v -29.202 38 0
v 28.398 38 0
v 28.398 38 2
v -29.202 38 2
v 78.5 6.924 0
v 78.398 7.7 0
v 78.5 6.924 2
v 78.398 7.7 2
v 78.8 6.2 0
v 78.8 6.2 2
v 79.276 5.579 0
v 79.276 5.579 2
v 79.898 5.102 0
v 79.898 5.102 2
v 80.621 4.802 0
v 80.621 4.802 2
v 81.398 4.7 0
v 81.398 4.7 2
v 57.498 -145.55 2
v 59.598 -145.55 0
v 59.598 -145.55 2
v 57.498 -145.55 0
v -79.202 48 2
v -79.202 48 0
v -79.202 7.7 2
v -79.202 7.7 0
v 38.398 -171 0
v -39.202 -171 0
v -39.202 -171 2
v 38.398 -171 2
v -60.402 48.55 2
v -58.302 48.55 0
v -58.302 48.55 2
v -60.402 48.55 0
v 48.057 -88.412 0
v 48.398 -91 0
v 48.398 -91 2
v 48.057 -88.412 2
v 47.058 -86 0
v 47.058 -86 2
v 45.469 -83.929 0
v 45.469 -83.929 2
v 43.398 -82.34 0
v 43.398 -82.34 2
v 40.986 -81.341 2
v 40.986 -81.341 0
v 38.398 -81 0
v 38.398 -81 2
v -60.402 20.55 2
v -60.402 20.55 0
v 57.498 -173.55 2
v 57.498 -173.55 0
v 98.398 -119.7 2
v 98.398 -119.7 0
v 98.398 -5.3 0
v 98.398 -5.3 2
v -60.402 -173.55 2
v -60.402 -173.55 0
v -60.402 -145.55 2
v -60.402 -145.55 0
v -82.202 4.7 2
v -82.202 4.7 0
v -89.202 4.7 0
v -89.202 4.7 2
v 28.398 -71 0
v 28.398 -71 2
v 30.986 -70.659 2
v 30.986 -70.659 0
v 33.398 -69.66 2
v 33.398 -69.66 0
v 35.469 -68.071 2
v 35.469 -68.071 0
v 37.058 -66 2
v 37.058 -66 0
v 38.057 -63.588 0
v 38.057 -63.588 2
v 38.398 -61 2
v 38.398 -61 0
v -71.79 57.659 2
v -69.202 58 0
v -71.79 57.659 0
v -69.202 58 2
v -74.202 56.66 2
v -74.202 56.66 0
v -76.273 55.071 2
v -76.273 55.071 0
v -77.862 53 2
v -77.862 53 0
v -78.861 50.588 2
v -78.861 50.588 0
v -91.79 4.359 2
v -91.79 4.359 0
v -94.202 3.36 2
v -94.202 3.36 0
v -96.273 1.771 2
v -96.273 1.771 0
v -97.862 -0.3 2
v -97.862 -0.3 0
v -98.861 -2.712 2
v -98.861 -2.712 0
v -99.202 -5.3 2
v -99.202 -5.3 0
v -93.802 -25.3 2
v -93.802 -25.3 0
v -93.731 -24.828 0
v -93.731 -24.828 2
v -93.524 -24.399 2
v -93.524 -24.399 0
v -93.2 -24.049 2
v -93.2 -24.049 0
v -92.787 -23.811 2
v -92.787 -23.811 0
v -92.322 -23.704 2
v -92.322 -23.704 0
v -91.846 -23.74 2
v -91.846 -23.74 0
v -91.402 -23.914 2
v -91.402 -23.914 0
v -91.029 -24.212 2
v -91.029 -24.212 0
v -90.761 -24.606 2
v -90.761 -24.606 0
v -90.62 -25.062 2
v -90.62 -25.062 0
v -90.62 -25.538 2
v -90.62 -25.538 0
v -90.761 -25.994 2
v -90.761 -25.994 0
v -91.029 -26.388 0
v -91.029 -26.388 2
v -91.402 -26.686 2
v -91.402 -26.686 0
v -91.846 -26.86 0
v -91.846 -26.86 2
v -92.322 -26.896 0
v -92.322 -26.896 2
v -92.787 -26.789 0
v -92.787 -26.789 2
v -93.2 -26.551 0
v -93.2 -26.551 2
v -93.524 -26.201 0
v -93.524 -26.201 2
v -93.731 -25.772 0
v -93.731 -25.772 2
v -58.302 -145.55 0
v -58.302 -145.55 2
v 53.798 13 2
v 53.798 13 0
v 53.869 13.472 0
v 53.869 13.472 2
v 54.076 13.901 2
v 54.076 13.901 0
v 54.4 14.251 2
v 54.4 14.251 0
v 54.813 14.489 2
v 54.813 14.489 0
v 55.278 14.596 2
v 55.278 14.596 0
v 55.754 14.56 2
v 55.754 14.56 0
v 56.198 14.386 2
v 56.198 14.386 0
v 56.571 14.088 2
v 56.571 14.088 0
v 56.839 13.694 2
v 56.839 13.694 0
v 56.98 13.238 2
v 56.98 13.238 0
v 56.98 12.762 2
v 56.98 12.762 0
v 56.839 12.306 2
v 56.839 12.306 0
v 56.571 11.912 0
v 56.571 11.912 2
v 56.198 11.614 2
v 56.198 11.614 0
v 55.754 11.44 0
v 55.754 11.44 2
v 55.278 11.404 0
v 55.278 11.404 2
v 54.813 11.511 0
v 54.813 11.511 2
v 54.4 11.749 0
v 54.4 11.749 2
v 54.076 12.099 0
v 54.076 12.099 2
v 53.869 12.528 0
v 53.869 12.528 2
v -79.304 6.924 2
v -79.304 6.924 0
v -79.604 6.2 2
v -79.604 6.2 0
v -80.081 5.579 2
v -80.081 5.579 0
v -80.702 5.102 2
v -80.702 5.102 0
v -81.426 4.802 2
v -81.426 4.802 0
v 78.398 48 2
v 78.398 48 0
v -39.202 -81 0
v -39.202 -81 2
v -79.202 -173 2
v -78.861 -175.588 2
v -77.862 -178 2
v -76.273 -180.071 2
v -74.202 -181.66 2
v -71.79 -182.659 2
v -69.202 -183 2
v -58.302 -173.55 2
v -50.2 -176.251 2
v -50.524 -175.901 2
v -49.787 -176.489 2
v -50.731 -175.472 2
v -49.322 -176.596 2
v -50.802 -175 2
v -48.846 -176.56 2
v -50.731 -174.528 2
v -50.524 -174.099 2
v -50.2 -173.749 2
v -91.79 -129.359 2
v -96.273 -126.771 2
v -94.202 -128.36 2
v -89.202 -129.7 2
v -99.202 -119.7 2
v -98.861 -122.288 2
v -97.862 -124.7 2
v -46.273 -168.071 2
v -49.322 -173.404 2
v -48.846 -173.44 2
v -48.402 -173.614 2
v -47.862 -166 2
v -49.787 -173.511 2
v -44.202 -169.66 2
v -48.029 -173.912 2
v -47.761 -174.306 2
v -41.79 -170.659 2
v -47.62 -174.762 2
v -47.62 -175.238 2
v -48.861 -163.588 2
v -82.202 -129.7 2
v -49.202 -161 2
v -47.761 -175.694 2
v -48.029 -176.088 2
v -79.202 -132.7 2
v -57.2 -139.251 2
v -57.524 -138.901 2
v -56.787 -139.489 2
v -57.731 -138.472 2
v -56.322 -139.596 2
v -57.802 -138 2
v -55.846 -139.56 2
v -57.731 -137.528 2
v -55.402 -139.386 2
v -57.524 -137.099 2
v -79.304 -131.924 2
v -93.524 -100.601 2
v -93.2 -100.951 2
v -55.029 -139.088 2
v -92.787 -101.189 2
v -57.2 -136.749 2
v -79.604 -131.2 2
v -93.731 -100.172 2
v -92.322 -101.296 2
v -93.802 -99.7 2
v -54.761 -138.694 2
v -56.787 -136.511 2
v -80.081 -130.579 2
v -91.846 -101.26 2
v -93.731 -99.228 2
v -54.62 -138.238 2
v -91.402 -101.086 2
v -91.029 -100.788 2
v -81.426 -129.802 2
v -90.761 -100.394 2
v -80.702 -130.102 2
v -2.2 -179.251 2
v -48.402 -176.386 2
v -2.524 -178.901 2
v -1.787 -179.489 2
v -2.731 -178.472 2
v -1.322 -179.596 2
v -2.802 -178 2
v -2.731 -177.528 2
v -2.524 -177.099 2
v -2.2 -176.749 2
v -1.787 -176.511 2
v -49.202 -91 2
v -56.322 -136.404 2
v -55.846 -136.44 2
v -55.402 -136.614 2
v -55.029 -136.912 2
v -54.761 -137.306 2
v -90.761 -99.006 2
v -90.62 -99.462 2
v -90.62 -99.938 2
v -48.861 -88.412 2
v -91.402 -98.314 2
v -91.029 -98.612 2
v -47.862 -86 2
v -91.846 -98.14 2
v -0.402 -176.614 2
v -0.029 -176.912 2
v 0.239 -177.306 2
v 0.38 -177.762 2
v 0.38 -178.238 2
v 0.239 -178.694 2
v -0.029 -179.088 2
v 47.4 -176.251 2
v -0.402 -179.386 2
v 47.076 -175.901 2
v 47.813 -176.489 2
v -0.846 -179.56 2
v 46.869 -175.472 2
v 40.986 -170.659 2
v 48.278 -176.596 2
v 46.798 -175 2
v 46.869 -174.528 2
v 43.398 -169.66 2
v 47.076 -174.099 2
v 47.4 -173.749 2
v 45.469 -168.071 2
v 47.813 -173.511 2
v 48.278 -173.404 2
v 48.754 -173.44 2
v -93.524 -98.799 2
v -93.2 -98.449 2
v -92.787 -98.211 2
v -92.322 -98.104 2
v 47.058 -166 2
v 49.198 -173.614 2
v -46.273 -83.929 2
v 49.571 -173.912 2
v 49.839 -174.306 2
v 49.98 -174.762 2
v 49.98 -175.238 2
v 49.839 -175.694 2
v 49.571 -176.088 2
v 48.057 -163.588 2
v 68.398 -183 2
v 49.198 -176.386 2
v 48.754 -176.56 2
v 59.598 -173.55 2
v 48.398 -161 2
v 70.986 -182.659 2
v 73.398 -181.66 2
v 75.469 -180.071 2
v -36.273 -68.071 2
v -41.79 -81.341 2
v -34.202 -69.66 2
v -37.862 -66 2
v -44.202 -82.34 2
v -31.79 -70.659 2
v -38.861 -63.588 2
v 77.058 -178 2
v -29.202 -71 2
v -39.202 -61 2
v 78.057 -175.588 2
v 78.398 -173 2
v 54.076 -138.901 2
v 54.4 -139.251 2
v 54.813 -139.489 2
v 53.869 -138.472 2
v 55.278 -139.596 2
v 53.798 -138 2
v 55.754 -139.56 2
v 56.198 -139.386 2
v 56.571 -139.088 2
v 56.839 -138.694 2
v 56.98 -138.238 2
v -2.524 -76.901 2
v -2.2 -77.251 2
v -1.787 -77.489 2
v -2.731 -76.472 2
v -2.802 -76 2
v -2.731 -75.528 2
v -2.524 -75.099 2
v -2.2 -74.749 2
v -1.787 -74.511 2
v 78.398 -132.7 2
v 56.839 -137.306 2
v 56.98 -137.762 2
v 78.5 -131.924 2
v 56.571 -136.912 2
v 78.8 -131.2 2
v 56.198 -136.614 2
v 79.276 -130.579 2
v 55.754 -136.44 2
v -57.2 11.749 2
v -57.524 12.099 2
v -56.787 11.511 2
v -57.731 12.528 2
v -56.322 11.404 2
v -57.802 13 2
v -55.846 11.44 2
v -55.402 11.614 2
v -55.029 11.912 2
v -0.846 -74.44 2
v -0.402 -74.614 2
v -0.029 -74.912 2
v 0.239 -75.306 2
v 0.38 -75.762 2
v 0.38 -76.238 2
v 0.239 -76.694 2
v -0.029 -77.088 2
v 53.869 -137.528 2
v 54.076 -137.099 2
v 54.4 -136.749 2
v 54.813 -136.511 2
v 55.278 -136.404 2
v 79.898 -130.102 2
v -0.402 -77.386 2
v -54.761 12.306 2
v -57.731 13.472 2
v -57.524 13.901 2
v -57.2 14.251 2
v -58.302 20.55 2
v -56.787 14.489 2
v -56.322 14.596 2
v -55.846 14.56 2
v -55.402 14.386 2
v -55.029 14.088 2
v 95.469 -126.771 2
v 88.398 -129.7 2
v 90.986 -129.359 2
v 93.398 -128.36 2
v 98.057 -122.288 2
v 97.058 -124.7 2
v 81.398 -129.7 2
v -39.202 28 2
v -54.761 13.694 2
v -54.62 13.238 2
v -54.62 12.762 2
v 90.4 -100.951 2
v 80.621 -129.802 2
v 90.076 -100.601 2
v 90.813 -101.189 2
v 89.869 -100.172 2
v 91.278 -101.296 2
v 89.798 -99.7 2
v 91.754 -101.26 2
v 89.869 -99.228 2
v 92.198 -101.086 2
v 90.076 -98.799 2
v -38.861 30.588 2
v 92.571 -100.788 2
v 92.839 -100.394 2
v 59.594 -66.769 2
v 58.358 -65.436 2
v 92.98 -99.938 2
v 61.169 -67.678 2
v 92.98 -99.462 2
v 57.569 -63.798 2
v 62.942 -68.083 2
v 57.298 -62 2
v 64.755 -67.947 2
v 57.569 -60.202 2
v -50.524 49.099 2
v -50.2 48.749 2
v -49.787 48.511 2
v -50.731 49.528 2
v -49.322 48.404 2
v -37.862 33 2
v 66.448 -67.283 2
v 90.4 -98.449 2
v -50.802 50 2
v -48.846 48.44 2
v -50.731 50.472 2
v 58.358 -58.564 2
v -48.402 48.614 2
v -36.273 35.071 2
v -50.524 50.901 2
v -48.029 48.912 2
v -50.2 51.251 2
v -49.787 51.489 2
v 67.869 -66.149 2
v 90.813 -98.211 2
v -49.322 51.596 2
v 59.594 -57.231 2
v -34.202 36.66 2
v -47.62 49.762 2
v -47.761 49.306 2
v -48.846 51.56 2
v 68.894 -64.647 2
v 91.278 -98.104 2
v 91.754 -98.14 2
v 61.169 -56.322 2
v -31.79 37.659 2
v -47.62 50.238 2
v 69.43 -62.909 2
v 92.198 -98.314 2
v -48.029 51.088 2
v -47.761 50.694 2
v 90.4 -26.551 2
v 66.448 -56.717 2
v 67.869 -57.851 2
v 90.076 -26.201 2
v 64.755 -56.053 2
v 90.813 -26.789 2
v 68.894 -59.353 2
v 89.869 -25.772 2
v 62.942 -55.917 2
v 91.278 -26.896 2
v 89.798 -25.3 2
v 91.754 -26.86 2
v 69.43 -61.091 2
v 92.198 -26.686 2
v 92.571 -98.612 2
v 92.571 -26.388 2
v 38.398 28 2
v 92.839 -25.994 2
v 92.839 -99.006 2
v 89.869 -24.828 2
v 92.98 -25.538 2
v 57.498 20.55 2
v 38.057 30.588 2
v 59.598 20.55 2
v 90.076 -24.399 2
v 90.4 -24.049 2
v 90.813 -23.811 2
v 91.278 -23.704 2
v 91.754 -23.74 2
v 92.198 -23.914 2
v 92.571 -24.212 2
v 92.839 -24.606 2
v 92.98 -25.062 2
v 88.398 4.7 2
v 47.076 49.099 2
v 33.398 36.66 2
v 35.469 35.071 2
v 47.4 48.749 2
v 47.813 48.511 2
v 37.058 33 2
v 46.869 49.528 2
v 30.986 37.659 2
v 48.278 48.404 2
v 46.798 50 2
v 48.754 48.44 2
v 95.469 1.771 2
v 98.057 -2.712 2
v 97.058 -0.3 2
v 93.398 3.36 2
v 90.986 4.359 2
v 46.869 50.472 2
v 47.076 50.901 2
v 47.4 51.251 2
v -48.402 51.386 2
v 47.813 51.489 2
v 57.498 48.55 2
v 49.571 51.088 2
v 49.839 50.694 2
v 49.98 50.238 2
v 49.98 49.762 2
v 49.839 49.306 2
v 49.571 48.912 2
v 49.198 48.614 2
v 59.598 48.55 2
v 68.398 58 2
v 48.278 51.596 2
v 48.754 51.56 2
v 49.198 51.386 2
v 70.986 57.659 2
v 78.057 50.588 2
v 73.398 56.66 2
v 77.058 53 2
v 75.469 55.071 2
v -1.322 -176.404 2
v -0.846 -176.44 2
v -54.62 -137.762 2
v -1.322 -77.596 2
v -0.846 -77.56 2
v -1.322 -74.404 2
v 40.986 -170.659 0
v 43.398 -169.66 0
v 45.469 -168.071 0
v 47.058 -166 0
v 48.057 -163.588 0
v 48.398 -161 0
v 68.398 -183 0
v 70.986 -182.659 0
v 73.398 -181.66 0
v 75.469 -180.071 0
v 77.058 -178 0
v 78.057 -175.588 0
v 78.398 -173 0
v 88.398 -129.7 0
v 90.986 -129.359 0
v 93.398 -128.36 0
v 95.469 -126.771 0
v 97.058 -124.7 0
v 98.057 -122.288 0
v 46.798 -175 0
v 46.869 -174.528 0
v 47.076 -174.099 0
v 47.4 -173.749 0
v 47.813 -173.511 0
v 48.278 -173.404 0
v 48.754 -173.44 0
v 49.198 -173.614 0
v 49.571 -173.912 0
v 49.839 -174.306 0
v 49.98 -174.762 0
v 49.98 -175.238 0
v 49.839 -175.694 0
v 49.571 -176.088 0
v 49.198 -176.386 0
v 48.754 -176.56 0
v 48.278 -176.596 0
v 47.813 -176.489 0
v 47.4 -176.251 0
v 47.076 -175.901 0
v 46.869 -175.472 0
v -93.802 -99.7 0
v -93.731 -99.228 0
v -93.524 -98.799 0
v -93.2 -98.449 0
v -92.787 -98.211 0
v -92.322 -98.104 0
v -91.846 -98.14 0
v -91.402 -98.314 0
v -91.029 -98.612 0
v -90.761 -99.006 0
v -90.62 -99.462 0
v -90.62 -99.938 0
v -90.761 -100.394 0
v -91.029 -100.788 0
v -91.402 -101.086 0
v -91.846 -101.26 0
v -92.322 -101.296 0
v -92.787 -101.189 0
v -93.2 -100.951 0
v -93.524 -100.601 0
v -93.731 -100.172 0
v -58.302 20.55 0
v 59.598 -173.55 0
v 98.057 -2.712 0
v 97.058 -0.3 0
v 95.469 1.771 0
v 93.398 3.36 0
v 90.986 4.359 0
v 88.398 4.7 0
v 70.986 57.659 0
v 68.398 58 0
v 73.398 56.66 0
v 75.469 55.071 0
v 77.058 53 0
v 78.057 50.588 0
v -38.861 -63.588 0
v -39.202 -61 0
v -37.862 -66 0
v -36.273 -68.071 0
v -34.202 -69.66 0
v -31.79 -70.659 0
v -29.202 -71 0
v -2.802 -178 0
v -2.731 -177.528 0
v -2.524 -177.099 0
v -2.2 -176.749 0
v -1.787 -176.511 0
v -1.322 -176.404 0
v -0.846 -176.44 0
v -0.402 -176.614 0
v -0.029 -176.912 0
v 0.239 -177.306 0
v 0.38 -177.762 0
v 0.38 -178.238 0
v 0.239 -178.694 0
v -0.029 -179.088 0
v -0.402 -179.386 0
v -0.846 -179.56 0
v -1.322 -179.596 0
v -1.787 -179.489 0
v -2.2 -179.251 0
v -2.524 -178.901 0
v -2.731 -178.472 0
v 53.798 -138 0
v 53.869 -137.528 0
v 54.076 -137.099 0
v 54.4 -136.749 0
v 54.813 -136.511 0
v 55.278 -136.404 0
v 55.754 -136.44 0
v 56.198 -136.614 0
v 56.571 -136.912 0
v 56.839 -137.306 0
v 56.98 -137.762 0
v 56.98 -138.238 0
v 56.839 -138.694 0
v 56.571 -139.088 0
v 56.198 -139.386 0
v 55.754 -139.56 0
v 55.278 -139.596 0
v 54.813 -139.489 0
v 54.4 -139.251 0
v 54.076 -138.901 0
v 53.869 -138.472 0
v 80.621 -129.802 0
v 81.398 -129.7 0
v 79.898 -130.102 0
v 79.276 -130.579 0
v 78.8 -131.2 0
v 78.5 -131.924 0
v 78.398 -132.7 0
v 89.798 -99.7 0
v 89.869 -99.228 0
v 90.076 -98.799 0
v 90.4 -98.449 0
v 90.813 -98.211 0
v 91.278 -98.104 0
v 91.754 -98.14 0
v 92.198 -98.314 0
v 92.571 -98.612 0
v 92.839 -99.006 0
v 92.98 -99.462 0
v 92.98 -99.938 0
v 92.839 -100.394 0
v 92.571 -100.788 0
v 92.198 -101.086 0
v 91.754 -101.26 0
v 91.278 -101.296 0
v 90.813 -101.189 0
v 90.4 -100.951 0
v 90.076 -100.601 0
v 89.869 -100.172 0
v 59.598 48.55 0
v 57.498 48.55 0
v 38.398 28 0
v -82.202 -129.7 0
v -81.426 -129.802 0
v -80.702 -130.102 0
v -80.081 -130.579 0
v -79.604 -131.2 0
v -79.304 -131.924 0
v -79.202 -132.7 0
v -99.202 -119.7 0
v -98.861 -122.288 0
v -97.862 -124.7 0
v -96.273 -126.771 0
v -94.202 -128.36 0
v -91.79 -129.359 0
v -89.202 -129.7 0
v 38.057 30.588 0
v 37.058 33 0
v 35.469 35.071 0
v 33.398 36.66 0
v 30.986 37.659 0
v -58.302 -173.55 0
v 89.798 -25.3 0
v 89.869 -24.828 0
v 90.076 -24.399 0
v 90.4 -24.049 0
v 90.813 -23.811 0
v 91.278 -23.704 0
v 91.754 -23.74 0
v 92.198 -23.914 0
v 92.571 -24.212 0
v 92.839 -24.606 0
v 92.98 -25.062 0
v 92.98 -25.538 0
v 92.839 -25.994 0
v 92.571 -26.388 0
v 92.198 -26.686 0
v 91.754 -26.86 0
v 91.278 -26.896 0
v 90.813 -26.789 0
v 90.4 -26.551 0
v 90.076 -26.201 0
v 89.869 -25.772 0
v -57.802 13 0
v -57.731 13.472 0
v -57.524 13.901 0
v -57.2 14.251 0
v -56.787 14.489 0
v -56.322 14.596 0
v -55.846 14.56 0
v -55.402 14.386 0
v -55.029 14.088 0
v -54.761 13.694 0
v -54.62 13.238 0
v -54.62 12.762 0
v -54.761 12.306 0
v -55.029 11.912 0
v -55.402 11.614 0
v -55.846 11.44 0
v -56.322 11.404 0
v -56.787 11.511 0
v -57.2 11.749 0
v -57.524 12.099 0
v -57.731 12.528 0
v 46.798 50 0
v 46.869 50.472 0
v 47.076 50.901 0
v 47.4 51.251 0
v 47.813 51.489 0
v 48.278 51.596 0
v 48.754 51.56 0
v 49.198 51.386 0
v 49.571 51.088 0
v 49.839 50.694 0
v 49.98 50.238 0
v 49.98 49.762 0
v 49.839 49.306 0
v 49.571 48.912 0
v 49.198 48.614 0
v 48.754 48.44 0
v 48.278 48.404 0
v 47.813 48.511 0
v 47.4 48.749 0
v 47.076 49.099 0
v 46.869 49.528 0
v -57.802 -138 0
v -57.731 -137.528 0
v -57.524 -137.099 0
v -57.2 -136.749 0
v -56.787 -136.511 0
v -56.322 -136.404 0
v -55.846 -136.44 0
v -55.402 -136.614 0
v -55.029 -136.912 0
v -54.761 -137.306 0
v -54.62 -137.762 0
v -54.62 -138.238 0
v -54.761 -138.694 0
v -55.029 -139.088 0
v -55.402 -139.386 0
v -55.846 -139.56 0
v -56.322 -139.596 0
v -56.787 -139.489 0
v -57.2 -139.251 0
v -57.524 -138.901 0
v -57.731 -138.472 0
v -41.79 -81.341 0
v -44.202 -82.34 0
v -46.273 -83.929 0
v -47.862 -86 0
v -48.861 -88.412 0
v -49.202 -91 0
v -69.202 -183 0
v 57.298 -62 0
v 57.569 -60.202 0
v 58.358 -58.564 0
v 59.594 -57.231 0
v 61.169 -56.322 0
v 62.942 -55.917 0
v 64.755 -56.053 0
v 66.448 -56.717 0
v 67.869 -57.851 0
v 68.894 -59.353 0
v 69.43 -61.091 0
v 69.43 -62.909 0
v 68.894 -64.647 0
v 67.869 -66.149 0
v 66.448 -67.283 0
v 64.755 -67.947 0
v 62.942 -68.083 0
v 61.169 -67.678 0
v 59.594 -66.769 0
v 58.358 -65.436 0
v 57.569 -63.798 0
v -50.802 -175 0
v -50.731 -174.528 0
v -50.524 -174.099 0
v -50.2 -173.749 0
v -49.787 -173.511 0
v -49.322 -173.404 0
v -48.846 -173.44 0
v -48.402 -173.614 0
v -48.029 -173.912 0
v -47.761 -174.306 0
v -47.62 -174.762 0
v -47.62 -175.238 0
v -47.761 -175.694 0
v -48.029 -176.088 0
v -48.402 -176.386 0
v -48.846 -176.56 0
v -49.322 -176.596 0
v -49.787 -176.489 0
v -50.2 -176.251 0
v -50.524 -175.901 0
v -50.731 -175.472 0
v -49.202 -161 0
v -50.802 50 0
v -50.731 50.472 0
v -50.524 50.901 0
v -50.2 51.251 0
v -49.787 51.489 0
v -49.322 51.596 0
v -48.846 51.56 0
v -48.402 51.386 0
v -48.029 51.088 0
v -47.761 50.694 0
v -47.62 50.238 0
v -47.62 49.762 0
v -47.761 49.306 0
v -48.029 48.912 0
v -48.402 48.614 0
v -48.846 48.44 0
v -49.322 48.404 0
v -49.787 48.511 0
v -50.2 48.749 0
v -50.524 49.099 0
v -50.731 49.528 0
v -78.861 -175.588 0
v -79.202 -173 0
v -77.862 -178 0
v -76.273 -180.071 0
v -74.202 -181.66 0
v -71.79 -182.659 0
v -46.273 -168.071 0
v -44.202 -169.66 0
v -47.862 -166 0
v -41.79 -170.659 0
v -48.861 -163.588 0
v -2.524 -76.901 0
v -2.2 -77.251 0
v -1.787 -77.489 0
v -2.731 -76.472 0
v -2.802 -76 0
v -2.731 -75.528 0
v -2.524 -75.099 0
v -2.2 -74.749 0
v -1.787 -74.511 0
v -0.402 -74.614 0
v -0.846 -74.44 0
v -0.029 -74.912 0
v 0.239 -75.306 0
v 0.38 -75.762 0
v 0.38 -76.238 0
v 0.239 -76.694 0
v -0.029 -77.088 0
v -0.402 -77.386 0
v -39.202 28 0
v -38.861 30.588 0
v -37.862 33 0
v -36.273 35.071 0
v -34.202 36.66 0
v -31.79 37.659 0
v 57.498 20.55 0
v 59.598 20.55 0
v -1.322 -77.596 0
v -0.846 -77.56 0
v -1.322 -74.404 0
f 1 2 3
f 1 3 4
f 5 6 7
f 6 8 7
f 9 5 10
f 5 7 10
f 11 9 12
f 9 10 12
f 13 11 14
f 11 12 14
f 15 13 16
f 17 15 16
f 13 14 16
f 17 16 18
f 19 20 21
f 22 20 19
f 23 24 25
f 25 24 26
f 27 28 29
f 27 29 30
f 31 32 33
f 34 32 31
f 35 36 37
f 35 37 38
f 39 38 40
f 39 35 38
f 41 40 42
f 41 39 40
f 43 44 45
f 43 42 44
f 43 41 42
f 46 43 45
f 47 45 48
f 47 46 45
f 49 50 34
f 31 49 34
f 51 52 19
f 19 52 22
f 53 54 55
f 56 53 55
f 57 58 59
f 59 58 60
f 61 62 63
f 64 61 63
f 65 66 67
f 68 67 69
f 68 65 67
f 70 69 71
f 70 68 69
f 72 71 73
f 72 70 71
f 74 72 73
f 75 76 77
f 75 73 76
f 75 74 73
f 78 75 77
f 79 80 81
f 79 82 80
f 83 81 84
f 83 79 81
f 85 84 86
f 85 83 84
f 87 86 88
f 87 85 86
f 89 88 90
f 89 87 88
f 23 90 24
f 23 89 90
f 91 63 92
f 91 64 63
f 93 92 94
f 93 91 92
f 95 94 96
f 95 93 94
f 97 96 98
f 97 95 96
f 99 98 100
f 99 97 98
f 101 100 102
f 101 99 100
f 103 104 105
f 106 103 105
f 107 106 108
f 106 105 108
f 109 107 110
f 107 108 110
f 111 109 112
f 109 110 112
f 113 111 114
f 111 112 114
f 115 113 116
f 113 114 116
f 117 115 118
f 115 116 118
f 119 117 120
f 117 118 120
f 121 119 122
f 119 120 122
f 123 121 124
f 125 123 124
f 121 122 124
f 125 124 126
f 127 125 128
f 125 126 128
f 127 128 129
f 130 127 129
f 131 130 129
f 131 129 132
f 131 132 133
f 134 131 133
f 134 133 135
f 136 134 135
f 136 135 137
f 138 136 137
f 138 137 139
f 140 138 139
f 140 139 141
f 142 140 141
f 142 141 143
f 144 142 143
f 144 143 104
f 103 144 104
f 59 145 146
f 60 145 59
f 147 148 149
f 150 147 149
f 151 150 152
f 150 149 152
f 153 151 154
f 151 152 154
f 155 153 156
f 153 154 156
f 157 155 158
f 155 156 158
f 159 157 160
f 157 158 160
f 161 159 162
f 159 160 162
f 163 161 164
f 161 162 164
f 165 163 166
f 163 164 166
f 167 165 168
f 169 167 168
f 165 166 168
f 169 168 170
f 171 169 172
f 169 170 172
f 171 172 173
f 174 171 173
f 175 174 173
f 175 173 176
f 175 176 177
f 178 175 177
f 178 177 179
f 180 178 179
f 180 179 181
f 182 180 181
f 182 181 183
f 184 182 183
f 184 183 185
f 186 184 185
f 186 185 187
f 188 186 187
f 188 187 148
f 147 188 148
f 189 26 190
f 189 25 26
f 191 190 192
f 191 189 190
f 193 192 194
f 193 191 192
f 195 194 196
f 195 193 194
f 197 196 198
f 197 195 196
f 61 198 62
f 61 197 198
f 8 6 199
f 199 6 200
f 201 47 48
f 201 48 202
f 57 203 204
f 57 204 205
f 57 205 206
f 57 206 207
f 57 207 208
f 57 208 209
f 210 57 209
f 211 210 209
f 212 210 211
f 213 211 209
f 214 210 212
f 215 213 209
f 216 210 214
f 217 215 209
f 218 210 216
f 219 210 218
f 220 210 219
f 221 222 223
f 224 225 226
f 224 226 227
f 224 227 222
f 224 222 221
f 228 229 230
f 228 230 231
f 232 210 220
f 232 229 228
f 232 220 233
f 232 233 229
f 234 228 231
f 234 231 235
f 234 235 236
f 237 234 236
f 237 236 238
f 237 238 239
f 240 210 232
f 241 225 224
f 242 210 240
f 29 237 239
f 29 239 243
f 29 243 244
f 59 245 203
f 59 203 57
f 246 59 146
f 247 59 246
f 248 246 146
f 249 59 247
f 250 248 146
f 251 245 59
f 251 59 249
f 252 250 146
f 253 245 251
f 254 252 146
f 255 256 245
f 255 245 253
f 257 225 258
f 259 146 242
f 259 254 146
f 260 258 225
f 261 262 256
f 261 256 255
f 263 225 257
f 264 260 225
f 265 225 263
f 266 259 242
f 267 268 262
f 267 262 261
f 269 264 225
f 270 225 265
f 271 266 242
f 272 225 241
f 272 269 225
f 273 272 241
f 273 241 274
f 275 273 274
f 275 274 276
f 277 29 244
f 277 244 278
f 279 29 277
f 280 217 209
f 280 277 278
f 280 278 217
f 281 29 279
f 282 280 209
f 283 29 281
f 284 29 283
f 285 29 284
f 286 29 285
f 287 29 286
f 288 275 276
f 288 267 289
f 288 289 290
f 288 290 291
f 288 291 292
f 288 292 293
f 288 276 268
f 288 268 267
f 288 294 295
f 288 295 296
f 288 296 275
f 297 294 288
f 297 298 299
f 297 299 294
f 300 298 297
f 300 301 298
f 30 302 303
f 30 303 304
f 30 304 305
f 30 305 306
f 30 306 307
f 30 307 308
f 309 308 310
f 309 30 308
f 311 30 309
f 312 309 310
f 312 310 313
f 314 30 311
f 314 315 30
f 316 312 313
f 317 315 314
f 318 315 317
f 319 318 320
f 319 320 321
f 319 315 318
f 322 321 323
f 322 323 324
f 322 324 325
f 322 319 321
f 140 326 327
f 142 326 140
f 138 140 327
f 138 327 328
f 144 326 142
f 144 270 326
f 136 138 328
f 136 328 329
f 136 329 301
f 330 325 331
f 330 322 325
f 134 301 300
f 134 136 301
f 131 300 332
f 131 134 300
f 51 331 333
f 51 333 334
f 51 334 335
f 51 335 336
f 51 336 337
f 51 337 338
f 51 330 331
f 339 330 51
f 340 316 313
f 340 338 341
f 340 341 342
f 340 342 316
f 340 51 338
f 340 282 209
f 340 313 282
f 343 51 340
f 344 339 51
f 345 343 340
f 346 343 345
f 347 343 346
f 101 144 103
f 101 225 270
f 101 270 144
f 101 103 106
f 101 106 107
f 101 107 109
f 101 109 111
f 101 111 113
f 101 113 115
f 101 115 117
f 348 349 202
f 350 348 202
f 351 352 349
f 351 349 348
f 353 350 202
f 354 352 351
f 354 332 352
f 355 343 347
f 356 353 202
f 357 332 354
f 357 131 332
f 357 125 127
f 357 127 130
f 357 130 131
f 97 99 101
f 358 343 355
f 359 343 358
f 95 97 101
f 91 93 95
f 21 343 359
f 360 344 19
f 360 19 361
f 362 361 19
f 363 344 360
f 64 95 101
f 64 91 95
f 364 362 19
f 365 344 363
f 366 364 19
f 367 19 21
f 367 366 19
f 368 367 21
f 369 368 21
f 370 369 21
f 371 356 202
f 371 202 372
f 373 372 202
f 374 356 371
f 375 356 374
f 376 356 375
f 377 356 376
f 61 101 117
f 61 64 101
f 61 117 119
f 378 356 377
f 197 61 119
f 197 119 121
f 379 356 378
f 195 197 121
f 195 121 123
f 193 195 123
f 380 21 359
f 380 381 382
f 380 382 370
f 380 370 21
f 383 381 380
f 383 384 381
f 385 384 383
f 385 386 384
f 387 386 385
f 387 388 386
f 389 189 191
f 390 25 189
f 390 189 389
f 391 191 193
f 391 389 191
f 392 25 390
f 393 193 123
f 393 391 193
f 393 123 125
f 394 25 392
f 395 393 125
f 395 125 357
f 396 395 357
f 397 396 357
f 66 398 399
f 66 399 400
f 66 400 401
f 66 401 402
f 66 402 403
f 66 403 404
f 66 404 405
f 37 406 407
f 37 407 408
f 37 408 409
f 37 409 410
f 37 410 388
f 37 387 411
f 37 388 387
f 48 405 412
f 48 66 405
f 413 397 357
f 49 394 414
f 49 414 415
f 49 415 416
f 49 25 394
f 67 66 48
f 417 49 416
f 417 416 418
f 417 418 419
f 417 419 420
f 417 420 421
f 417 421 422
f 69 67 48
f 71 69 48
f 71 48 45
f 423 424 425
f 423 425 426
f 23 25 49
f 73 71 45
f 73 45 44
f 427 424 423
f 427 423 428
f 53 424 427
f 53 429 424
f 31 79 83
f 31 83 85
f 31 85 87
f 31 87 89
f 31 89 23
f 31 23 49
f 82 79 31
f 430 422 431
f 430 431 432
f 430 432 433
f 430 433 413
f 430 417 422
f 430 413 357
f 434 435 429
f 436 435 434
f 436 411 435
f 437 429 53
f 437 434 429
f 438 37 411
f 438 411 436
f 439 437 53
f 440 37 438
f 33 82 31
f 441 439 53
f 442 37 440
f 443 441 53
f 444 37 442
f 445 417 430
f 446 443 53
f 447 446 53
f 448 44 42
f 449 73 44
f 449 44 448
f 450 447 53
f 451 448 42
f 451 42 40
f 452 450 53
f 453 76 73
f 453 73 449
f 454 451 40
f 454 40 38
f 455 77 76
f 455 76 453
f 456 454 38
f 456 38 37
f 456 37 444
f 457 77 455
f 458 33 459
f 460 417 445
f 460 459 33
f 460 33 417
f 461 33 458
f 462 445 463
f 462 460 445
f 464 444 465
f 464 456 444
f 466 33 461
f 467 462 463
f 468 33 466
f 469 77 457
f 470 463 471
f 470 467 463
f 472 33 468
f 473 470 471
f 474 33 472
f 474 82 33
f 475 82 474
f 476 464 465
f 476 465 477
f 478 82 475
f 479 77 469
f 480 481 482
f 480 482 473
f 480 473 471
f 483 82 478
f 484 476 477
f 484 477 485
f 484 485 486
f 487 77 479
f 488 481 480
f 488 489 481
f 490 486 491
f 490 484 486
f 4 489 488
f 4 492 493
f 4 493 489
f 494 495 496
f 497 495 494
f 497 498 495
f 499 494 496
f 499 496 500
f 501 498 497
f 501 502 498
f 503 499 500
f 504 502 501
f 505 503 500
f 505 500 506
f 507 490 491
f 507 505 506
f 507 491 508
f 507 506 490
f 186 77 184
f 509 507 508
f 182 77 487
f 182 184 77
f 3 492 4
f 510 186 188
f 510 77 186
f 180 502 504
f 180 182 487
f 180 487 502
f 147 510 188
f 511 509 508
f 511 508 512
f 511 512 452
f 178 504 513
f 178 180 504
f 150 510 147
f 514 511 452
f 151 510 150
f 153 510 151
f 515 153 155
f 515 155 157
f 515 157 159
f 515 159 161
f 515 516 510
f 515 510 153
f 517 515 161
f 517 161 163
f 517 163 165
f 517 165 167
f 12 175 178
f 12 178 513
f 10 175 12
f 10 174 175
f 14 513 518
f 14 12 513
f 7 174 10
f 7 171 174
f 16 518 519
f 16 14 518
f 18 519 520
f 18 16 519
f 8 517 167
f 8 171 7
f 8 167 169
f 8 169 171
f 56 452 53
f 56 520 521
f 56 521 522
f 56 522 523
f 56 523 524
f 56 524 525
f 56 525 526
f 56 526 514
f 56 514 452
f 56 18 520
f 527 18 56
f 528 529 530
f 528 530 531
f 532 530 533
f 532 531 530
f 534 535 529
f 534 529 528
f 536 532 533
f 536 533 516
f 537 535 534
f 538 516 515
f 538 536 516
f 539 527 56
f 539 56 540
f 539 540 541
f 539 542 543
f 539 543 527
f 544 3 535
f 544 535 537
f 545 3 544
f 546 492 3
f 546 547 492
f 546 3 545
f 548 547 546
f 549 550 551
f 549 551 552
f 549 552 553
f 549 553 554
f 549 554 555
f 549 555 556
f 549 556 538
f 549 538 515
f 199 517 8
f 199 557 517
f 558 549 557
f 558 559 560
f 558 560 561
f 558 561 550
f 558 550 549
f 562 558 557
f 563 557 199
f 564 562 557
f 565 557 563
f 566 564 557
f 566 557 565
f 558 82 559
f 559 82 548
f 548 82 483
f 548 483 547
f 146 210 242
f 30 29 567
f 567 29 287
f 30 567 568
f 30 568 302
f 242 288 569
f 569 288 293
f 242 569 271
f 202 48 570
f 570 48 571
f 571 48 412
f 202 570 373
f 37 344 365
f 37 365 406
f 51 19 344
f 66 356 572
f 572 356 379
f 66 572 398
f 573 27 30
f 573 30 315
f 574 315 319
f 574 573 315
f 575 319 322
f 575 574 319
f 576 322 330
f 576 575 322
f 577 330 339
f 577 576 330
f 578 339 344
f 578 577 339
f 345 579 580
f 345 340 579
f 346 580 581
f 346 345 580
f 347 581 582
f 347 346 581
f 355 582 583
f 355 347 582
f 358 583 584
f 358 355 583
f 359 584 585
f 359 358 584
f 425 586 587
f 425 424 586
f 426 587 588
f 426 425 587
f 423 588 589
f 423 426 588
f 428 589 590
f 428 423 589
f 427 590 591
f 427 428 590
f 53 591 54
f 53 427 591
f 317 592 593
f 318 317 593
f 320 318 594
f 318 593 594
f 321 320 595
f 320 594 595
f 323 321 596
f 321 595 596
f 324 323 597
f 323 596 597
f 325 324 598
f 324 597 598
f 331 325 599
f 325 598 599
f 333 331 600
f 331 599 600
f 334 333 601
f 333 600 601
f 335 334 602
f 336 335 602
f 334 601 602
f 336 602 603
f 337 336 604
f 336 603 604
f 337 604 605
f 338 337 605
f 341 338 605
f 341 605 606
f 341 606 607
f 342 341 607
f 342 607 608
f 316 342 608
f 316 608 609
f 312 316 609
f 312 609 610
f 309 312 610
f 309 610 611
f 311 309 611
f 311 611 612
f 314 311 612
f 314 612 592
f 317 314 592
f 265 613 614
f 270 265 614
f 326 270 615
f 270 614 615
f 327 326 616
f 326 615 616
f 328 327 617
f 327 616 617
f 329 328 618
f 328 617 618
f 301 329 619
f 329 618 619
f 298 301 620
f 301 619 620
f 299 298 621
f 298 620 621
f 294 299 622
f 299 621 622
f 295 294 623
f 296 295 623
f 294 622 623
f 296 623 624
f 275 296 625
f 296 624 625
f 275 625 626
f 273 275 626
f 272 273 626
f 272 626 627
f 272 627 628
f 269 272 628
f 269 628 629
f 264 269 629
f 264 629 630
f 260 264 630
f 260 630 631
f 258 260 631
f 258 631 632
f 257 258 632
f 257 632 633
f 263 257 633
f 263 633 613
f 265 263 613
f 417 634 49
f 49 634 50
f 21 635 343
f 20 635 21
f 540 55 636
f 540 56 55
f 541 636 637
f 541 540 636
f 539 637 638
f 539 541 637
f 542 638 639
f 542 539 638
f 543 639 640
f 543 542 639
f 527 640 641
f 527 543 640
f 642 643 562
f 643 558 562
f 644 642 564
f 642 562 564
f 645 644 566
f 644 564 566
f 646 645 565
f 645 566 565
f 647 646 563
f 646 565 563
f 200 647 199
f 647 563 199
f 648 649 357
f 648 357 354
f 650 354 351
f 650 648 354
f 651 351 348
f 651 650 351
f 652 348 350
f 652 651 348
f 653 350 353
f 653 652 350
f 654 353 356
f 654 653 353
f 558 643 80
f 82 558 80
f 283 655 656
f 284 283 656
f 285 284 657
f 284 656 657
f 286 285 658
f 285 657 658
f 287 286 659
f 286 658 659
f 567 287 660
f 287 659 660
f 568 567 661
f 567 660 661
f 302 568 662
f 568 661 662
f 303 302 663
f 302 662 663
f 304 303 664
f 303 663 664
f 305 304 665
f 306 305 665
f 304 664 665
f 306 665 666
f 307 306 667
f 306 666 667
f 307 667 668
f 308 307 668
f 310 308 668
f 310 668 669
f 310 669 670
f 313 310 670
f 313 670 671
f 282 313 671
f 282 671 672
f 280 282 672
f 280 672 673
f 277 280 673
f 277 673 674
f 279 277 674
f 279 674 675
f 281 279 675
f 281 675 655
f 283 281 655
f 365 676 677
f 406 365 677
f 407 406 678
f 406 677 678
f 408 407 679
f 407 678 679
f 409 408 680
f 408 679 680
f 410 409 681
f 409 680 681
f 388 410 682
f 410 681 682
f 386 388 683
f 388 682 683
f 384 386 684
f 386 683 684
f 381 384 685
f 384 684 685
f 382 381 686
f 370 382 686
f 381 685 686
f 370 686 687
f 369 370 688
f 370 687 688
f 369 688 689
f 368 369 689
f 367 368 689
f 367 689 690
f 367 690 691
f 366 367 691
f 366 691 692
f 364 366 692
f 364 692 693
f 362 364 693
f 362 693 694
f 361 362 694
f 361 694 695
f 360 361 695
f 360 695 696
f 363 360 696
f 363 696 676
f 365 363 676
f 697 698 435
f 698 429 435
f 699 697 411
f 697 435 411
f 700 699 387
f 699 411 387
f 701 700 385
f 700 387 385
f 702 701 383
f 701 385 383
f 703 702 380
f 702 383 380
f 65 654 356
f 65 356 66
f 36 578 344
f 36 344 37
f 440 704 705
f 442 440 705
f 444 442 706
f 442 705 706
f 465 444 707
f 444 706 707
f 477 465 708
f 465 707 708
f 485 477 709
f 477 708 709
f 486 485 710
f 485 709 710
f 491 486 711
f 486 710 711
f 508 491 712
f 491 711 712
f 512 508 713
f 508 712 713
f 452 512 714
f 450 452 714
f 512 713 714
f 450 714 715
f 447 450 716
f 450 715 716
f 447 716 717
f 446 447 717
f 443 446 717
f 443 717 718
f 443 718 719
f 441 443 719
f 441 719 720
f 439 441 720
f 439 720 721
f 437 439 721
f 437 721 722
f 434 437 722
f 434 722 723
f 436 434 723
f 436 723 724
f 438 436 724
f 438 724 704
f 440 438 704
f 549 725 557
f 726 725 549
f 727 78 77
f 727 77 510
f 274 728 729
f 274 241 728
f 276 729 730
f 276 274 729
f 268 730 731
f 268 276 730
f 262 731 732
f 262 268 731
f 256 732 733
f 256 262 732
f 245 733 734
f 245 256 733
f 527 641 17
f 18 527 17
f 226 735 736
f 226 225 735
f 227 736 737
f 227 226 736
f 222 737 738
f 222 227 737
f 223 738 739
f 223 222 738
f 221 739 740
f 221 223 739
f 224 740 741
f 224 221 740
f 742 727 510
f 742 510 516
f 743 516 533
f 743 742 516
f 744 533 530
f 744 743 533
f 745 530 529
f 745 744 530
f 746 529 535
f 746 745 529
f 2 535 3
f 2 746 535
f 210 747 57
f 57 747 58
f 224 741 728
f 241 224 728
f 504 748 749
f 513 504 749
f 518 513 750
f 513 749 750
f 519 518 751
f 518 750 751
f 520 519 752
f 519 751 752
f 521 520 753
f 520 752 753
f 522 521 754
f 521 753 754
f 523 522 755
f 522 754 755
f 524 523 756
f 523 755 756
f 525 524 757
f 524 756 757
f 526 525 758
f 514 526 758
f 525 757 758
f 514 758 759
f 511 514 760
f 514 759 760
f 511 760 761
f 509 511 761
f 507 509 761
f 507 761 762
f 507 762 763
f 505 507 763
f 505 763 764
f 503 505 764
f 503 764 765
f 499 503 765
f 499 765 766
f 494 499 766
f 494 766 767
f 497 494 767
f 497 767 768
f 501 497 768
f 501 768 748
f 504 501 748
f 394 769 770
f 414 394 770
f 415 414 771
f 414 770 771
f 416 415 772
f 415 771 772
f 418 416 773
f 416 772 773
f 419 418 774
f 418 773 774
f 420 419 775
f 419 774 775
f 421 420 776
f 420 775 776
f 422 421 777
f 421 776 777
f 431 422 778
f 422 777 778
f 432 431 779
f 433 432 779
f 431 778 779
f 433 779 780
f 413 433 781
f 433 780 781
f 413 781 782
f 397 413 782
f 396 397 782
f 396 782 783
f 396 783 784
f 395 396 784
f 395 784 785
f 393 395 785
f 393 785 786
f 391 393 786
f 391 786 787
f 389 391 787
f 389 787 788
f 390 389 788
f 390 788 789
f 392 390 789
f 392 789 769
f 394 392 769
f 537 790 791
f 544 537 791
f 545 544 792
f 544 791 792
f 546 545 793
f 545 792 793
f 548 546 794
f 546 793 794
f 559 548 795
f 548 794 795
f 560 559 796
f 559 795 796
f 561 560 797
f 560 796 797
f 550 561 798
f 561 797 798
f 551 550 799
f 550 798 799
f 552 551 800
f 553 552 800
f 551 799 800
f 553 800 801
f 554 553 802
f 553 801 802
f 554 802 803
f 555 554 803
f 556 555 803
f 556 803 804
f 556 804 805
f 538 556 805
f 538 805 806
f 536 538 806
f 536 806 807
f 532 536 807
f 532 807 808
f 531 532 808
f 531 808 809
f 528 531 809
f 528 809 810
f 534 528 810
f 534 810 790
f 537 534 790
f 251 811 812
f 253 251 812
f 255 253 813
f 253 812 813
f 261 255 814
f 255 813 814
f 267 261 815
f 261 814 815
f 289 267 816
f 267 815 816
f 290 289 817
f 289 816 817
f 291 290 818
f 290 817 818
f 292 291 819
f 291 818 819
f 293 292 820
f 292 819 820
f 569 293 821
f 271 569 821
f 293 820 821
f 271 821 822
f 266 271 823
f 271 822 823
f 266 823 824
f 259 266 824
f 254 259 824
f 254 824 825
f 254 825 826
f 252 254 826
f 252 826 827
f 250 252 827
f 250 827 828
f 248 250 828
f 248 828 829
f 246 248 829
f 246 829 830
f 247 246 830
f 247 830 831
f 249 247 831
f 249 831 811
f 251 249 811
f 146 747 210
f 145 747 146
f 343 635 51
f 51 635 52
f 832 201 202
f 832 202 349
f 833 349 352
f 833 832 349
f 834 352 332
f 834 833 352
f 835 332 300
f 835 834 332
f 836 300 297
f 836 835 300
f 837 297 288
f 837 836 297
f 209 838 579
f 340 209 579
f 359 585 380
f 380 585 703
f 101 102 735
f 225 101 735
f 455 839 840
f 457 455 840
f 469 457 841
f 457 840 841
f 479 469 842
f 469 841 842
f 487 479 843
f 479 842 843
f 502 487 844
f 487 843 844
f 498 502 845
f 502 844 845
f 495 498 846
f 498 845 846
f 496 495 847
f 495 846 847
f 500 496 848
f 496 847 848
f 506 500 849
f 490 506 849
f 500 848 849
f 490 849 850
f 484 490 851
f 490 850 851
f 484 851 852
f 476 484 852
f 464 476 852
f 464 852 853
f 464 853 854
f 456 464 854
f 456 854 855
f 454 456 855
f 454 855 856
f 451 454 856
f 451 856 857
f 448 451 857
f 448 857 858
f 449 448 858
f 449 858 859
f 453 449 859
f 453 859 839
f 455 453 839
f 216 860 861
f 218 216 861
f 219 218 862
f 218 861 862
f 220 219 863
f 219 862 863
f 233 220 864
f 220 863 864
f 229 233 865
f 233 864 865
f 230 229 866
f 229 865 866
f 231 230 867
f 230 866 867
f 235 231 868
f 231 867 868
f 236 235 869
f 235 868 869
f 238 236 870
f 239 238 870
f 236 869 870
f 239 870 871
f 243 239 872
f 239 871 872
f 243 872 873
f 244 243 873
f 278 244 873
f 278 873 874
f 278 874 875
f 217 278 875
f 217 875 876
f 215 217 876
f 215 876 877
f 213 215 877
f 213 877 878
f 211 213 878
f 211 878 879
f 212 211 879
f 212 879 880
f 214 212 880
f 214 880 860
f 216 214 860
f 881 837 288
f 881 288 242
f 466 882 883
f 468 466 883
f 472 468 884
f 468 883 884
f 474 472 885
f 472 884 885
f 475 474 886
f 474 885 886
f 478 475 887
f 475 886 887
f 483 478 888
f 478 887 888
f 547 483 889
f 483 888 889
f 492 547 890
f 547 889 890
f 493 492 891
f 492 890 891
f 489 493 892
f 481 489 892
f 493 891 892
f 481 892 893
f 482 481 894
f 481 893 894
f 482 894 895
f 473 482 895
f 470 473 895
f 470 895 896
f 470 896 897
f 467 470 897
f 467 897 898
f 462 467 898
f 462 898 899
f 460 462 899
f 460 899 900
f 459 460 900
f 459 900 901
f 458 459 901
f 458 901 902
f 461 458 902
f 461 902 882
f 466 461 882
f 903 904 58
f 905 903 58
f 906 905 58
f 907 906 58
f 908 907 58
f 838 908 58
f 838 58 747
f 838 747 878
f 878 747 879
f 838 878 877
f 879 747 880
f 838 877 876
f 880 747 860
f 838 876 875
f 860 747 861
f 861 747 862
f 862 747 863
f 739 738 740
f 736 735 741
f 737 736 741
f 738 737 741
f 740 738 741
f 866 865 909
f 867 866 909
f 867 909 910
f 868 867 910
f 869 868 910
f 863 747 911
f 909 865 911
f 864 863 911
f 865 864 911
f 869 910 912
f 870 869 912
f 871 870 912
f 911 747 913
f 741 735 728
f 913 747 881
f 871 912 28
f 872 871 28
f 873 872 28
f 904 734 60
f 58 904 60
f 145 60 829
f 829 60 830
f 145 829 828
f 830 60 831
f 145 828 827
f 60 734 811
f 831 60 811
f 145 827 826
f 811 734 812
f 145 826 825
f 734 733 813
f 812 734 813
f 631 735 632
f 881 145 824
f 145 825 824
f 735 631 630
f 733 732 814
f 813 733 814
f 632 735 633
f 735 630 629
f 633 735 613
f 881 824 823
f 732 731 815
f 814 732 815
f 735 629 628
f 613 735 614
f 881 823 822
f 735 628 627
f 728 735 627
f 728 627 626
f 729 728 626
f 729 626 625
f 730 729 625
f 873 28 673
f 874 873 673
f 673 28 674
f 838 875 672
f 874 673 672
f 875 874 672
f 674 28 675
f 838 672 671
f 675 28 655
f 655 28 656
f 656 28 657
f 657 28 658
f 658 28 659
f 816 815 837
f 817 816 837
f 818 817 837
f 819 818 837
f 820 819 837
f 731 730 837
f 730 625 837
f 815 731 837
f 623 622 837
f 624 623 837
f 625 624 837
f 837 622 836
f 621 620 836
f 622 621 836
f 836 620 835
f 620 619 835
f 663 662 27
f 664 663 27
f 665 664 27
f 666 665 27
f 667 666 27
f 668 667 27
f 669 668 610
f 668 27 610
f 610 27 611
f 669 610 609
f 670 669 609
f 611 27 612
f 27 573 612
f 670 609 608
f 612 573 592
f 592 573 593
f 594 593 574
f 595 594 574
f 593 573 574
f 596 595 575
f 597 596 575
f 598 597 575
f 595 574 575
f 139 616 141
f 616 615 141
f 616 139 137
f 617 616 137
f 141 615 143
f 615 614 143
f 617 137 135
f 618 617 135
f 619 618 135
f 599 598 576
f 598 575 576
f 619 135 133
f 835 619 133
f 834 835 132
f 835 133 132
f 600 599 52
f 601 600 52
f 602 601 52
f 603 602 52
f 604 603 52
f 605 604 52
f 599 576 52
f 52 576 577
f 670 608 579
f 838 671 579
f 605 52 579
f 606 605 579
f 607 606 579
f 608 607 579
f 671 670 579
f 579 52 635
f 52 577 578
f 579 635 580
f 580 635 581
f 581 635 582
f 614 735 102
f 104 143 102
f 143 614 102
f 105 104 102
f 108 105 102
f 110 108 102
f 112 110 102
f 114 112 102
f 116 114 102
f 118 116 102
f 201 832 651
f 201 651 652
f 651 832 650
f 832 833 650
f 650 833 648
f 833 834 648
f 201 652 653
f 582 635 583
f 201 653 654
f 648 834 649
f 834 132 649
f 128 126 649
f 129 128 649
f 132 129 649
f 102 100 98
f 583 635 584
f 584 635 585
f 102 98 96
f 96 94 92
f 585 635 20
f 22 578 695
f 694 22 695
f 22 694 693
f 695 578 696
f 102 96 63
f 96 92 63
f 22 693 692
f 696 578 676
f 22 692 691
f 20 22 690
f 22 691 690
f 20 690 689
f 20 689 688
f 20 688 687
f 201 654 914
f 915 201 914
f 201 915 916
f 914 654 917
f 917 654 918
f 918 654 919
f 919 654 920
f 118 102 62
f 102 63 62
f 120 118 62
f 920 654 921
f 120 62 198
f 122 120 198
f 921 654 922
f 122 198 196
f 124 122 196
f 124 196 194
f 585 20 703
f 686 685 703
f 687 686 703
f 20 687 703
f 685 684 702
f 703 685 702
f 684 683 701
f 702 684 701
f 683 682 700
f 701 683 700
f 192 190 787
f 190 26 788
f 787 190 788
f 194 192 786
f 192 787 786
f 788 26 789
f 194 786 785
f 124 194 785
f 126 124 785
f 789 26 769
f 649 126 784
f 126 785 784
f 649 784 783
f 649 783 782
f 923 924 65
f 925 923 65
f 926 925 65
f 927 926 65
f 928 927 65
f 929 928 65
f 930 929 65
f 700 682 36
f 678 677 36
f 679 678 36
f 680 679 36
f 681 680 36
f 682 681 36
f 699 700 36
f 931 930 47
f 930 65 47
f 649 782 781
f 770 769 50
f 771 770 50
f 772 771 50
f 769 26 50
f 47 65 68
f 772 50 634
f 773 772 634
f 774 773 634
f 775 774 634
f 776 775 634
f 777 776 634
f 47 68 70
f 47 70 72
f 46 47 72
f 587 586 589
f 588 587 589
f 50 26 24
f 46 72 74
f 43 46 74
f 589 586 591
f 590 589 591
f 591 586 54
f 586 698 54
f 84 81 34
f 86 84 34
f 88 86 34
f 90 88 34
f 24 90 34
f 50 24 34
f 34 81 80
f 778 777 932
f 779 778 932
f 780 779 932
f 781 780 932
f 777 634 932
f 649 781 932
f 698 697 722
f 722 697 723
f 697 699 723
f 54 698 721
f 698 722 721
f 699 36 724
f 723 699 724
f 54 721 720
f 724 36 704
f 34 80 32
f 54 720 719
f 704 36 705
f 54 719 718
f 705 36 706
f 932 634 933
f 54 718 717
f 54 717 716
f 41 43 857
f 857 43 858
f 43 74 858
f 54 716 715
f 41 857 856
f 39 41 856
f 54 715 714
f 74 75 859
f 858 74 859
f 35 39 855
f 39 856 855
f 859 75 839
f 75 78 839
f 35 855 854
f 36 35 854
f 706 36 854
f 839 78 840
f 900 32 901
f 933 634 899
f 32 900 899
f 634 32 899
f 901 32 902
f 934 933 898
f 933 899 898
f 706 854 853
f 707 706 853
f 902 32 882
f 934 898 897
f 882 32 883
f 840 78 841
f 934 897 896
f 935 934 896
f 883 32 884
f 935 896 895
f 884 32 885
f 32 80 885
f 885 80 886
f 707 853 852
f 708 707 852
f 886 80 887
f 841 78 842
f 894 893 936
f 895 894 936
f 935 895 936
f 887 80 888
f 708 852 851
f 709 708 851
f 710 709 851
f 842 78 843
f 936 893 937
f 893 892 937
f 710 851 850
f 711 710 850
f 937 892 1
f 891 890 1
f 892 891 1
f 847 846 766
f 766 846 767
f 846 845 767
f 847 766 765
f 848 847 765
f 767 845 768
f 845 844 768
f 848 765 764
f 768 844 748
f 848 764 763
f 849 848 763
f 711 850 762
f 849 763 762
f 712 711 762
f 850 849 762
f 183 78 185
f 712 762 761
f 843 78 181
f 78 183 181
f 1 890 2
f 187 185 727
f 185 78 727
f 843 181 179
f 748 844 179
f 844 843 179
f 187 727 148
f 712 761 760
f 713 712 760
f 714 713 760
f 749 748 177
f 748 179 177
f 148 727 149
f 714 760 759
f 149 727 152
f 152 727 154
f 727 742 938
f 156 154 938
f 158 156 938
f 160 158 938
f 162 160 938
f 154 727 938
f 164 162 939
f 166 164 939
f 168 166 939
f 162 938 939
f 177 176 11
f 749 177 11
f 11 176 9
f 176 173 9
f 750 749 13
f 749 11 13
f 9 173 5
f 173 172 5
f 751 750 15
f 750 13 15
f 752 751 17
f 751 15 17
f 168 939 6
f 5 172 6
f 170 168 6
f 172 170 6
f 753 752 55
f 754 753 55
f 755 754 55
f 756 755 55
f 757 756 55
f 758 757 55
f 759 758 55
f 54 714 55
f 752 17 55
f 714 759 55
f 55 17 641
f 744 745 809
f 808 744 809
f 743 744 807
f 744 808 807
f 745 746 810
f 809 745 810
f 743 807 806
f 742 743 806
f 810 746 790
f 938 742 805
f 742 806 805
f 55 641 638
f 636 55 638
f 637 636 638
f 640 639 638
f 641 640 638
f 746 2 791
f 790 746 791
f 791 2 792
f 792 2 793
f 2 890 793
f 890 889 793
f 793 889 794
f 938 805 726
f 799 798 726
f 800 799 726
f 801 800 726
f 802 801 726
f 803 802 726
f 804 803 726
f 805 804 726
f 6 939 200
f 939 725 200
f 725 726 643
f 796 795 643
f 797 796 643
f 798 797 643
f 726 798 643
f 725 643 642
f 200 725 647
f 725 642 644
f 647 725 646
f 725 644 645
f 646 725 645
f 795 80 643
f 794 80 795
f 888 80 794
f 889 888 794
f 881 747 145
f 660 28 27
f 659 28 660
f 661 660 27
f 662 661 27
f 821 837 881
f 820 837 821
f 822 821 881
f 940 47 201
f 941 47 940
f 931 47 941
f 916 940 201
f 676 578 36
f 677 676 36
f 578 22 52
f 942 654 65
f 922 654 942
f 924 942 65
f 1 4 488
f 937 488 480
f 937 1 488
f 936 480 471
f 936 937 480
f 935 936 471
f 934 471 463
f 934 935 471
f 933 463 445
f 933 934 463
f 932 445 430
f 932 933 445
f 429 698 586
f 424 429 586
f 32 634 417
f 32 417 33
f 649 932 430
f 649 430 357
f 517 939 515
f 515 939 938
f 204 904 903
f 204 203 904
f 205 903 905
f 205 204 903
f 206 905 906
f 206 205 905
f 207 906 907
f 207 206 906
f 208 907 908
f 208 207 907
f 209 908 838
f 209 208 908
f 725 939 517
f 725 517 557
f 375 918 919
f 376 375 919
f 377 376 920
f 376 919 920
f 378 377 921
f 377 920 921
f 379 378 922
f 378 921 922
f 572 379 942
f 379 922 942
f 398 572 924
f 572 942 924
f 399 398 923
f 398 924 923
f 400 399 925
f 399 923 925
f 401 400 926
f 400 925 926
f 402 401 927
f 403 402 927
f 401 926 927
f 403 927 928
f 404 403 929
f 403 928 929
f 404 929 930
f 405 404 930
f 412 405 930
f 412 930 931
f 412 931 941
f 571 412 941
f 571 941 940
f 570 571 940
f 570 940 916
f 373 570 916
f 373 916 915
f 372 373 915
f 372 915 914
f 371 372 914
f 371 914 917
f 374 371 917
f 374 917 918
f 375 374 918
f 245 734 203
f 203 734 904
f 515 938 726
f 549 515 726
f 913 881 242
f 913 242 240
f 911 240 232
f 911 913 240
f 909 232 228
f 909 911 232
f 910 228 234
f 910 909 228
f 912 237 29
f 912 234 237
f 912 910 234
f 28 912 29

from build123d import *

# Parameters (mm, degrees)
Y_KSEKLIK_EKSTR_ZYON1_DEPTH = 2
RADYUS1_R                   = 10
RADYUS2_R                   = 3
IZIM2_W                     = 2.1
IZIM2_H                     = 28
KES_EKSTR_ZYON1_DEPTH       = 10
KES_EKSTR_ZYON2_DEPTH       = 10
KES_EKSTR_ZYON3_DEPTH       = 10
IZIM5_R                     = 6.1
KES_EKSTR_ZYON4_DEPTH       = 10
IZIM6_R                     = 1.6
KES_EKSTR_ZYON5_DEPTH       = 10


with BuildPart() as part:
    # Çizim1 → Yükseklik-Ekstrüzyon1 (new body)
    with BuildSketch(Plane.XY):
        Polygon((78.397764574, 53), (78.397764574, 58), (-79.202235426, 58), (-79.202235426, 53), (-79.202235426, 4.7), (-99.202235426, 4.7), (-99.202235426, -129.7), (-79.202235426, -129.7), (-79.202235426, -178), (-79.202235426, -183), (78.397764574, -183), (78.397764574, -178), (78.397764574, -129.7), (98.397764574, -129.7), (98.397764574, 4.7), (78.397764574, 4.7), align=None)
    extrude(amount=Y_KSEKLIK_EKSTR_ZYON1_DEPTH)

    # Radyus1
    radyus1_edges = [part.edges().sort_by_distance(p)[0] for p in [
        (-79.202235426, 58, 1),
        (78.397764574, 58, 1),
        (98.397764574, 4.7, 1),
        (98.397764574, -129.7, 1),
        (78.397764574, -183, 1),
        (-79.202235426, -183, 1),
        (-99.202235426, -129.7, 1),
        (-99.202235426, 4.7, 1),
    ]]
    fillet(radyus1_edges, radius=RADYUS1_R)

    # Radyus2
    radyus2_edges = [part.edges().sort_by_distance(p)[0] for p in [
        (78.397764574, 4.7, 1),
        (78.397764574, -129.7, 1),
        (-79.202235426, -129.7, 1),
        (-79.202235426, 4.7, 1),
    ]]
    fillet(radyus2_edges, radius=RADYUS2_R)

    # Çizim2 → Kes-Ekstrüzyon1 (cut)
    with BuildSketch(Plane(origin=(0, 0, 0), x_dir=(-1, 0, 0), z_dir=(0, 0, -1))):
        with Locations((-58.547764574, -159.55)):
            Rectangle(IZIM2_W, IZIM2_H)
        with Locations((59.352235426, -159.55)):
            Rectangle(IZIM2_W, IZIM2_H)
        with Locations((59.352235426, 34.55)):
            Rectangle(IZIM2_W, IZIM2_H)
        with Locations((-58.547764574, 34.55)):
            Rectangle(IZIM2_W, IZIM2_H)
    extrude(amount=-KES_EKSTR_ZYON1_DEPTH, mode=Mode.SUBTRACT)

    # Çizim3 → Kes-Ekstrüzyon2 (cut)
    with BuildSketch(Plane(origin=(0, 0, 0), x_dir=(-1, 0, 0), z_dir=(0, 0, -1))):
        with BuildLine():
            Line((39.202235426, -171), (-38.397764574, -171))
            ThreePointArc((-38.397764574, -171), (-45.468832385, -168.071067812), (-48.397764574, -161))
            Line((-48.397764574, -161), (-48.397764574, -91))
            ThreePointArc((-48.397764574, -91), (-45.468832385, -83.928932188), (-38.397764574, -81))
            Line((-38.397764574, -81), (39.202235426, -81))
            ThreePointArc((39.202235426, -81), (46.273303238, -83.928932188), (49.202235426, -91))
            Line((49.202235426, -91), (49.202235426, -161))
            ThreePointArc((49.202235426, -161), (46.273303238, -168.071067812), (39.202235426, -171))
        make_face()
    extrude(amount=-KES_EKSTR_ZYON2_DEPTH, mode=Mode.SUBTRACT)

    # Çizim4 → Kes-Ekstrüzyon3 (cut)
    with BuildSketch(Plane(origin=(0, 0, 0), x_dir=(-1, 0, 0), z_dir=(0, 0, -1))):
        with BuildLine():
            Line((29.202235426, -71), (-28.397764574, -71))
            ThreePointArc((-28.397764574, -71), (-35.468832385, -68.071067812), (-38.397764574, -61))
            Line((-38.397764574, -61), (-38.397764574, 28))
            ThreePointArc((-38.397764574, 28), (-35.468832385, 35.071067812), (-28.397764574, 38))
            Line((-28.397764574, 38), (29.202235426, 38))
            ThreePointArc((29.202235426, 38), (36.273303238, 35.071067812), (39.202235426, 28))
            Line((39.202235426, 28), (39.202235426, -61))
            ThreePointArc((39.202235426, -61), (36.273303238, -68.071067812), (29.202235426, -71))
        make_face()
    extrude(amount=-KES_EKSTR_ZYON3_DEPTH, mode=Mode.SUBTRACT)

    # Çizim5 → Kes-Ekstrüzyon4 (cut)
    with BuildSketch(Plane(origin=(0, 0, 0), x_dir=(-1, 0, 0), z_dir=(0, 0, -1))):
        with Locations((-63.397764574, -62)):
            Circle(IZIM5_R)
    extrude(amount=-KES_EKSTR_ZYON4_DEPTH, mode=Mode.SUBTRACT)

    # Çizim6 → Kes-Ekstrüzyon5 (cut)
    with BuildSketch(Plane(origin=(0, 0, 0), x_dir=(-1, 0, 0), z_dir=(0, 0, -1))):
        with Locations((49.202235426, -175)):
            Circle(IZIM6_R)
        with Locations((56.202235426, -138)):
            Circle(IZIM6_R)
        with Locations((1.202235426, -76)):
            Circle(IZIM6_R)
        with Locations((1.202235426, -178)):
            Circle(IZIM6_R)
        with Locations((92.202235426, -99.7)):
            Circle(IZIM6_R)
        with Locations((92.202235426, -25.3)):
            Circle(IZIM6_R)
        with Locations((56.202235426, 13)):
            Circle(IZIM6_R)
        with Locations((49.202235426, 50)):
            Circle(IZIM6_R)
        with Locations((-48.397764574, 50)):
            Circle(IZIM6_R)
        with Locations((-55.397764574, 13)):
            Circle(IZIM6_R)
        with Locations((-91.397764574, -25.3)):
            Circle(IZIM6_R)
        with Locations((-91.397764574, -99.7)):
            Circle(IZIM6_R)
        with Locations((-55.397764574, -138)):
            Circle(IZIM6_R)
        with Locations((-48.397764574, -175)):
            Circle(IZIM6_R)
    extrude(amount=-KES_EKSTR_ZYON5_DEPTH, mode=Mode.SUBTRACT)


solid = part.part
